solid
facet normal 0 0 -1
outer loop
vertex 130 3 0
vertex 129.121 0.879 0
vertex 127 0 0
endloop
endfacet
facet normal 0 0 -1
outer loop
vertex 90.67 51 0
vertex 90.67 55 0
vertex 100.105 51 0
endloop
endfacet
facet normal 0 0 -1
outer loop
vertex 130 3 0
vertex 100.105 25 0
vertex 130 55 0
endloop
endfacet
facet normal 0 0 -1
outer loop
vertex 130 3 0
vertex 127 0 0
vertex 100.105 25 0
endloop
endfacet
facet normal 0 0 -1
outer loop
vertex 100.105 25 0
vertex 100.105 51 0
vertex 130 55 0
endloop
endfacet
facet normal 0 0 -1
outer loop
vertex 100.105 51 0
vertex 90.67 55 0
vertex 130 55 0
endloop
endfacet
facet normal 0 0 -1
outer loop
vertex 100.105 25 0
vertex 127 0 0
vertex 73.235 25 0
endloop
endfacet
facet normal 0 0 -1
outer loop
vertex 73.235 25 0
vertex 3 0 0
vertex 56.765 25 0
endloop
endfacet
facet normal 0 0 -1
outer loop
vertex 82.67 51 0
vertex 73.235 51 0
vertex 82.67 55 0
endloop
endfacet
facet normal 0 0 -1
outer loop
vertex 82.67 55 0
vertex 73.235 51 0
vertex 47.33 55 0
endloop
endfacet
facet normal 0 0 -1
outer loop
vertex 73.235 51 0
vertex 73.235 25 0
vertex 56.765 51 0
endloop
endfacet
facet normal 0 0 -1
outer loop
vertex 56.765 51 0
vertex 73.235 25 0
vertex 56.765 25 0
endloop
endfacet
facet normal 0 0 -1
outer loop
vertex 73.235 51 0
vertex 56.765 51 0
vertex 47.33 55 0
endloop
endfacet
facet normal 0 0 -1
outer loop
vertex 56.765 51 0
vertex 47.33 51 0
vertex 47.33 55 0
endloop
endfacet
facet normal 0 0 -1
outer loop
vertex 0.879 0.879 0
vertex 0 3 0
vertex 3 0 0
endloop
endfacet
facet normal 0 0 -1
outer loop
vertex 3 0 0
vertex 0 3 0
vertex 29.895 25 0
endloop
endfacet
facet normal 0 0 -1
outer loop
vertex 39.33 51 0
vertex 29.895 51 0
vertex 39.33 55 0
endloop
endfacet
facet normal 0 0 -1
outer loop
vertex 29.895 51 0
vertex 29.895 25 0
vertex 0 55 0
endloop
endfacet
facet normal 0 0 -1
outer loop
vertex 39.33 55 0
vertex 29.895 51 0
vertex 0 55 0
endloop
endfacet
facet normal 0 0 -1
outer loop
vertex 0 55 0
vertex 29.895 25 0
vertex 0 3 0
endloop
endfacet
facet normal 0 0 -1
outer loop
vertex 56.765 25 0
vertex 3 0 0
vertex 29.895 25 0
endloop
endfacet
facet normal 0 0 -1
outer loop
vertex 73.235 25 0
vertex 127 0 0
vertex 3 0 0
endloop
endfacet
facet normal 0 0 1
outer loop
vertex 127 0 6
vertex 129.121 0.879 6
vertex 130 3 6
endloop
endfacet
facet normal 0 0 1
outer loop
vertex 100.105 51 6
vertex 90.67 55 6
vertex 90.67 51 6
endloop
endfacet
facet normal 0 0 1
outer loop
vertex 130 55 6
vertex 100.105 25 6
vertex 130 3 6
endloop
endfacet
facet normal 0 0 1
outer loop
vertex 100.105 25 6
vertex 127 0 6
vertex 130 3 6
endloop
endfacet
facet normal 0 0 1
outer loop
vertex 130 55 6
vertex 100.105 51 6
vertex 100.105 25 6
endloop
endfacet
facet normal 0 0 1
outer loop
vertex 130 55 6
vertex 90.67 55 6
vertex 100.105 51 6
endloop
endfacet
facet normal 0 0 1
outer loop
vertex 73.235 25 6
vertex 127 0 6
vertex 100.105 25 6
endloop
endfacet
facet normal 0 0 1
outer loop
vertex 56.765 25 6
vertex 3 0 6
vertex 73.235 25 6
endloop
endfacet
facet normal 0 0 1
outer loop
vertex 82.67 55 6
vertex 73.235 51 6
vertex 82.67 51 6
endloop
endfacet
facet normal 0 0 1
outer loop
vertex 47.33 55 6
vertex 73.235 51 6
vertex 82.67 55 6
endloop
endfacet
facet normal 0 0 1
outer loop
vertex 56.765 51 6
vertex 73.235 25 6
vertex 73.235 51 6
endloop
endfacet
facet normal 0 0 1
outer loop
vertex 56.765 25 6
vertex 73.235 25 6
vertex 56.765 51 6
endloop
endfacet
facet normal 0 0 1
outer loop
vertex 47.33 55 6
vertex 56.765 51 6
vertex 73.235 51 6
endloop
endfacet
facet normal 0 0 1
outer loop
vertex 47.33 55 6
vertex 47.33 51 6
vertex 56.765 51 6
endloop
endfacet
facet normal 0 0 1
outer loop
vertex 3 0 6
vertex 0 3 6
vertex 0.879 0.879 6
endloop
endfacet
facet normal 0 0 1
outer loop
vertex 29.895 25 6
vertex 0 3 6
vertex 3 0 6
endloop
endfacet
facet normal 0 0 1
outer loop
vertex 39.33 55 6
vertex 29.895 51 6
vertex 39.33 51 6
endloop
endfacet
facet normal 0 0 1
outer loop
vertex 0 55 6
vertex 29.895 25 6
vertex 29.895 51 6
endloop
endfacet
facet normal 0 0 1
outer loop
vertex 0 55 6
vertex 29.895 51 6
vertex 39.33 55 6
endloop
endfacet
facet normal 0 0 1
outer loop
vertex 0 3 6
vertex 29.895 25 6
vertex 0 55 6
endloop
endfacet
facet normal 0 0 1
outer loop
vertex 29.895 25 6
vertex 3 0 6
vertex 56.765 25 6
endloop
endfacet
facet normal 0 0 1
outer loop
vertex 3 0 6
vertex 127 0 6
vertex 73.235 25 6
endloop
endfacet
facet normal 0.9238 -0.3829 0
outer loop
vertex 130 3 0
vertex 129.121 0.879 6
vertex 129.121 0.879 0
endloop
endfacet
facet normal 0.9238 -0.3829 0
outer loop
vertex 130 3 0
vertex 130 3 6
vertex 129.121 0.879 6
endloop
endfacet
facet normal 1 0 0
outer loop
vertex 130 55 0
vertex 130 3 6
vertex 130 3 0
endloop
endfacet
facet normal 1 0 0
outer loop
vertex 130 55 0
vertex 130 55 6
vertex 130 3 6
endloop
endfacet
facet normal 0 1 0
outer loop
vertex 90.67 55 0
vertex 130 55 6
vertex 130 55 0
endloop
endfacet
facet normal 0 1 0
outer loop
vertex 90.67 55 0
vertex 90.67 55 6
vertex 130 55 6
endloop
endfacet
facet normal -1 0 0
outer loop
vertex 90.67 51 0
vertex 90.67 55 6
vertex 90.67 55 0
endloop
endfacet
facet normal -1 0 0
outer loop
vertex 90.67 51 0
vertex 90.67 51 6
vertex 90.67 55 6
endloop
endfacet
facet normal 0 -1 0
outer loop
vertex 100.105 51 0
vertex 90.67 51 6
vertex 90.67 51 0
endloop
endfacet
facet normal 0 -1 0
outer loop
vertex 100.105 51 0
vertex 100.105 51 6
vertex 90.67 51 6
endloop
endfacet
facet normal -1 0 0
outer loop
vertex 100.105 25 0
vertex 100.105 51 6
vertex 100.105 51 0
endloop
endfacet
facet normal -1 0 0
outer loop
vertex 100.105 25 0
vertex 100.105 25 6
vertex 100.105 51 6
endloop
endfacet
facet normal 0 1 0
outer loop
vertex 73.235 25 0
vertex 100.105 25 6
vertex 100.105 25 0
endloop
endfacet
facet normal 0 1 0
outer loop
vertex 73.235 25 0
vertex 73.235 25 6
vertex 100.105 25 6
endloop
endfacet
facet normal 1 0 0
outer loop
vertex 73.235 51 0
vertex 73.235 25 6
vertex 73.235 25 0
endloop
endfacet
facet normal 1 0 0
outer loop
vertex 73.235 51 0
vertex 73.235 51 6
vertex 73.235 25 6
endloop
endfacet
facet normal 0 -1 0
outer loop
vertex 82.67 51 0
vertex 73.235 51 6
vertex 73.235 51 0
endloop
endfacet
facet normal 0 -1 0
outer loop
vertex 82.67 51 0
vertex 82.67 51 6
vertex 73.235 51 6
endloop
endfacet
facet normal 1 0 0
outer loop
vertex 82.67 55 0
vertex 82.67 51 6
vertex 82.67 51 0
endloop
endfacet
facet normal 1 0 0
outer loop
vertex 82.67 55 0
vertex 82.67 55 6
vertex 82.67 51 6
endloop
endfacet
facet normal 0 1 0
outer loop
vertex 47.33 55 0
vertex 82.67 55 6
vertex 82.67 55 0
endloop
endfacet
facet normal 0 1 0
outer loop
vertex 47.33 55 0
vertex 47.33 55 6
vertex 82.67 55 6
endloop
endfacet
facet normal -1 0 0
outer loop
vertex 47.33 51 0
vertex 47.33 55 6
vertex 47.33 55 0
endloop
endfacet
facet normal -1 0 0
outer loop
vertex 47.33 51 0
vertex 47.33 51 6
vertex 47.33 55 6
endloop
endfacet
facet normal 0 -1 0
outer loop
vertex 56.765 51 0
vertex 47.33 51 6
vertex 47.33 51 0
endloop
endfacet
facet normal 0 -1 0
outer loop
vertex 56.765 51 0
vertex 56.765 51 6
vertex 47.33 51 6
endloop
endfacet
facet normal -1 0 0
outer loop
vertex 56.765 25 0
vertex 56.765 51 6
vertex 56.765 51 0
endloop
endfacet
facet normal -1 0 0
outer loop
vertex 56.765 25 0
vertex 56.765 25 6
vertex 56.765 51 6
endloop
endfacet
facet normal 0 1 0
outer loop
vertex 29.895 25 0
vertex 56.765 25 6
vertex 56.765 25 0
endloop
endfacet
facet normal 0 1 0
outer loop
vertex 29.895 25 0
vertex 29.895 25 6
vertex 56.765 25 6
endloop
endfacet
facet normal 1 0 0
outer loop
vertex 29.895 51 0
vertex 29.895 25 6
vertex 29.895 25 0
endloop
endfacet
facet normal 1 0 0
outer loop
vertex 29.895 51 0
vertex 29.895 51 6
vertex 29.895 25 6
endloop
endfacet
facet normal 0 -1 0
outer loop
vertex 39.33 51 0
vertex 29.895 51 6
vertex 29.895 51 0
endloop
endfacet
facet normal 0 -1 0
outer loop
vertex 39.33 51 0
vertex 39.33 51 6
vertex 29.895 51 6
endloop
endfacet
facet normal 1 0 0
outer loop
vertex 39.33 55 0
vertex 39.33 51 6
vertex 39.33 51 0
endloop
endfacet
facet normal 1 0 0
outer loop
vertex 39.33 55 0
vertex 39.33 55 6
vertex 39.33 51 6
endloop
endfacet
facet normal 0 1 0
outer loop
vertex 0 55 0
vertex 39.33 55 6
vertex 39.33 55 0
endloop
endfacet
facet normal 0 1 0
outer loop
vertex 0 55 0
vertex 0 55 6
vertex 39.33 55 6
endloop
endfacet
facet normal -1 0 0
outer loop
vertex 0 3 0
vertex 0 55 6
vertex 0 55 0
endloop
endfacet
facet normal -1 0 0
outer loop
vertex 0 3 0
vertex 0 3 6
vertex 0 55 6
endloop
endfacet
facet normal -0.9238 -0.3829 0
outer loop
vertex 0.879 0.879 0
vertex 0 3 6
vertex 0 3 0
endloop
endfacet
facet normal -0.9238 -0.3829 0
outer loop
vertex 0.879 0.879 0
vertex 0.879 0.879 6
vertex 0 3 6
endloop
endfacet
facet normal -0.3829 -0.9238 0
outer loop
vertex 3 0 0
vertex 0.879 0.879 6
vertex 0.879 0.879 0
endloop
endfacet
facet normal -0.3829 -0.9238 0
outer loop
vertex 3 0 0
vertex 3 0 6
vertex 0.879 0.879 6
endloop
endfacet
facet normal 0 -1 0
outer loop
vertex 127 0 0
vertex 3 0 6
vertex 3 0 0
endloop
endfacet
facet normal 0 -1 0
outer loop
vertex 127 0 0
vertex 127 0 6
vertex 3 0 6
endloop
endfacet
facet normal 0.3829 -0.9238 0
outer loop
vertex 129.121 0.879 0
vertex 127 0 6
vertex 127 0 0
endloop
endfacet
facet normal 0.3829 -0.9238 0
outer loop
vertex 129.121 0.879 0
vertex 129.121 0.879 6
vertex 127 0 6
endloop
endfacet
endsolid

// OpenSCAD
$fn = 32;

// ----------------------------------------------------------------------
// Window plate: 130 x 55 mm, 2 open windows
// ----------------------------------------------------------------------

// --- parameters (mm) ---
profile_height = 6;       // extrusion height
profile_points = 24;      // points of the closed outline

profile = [[0, 3], [0.879, 0.879], [3, 0], [127, 0], [129.121, 0.879], [130, 3], [130, 55], [90.67, 55], [90.67, 51], [100.105, 51], [100.105, 25], [73.235, 25], [73.235, 51], [82.67, 51], [82.67, 55], [47.33, 55], [47.33, 51], [56.765, 51], [56.765, 25], [29.895, 25], [29.895, 51], [39.33, 51], [39.33, 55], [0, 55]];  // single closed polygon, 24 points, counter clockwise

// --- the one profile operation ---
linear_extrude(height = profile_height) polygon(points = profile);
